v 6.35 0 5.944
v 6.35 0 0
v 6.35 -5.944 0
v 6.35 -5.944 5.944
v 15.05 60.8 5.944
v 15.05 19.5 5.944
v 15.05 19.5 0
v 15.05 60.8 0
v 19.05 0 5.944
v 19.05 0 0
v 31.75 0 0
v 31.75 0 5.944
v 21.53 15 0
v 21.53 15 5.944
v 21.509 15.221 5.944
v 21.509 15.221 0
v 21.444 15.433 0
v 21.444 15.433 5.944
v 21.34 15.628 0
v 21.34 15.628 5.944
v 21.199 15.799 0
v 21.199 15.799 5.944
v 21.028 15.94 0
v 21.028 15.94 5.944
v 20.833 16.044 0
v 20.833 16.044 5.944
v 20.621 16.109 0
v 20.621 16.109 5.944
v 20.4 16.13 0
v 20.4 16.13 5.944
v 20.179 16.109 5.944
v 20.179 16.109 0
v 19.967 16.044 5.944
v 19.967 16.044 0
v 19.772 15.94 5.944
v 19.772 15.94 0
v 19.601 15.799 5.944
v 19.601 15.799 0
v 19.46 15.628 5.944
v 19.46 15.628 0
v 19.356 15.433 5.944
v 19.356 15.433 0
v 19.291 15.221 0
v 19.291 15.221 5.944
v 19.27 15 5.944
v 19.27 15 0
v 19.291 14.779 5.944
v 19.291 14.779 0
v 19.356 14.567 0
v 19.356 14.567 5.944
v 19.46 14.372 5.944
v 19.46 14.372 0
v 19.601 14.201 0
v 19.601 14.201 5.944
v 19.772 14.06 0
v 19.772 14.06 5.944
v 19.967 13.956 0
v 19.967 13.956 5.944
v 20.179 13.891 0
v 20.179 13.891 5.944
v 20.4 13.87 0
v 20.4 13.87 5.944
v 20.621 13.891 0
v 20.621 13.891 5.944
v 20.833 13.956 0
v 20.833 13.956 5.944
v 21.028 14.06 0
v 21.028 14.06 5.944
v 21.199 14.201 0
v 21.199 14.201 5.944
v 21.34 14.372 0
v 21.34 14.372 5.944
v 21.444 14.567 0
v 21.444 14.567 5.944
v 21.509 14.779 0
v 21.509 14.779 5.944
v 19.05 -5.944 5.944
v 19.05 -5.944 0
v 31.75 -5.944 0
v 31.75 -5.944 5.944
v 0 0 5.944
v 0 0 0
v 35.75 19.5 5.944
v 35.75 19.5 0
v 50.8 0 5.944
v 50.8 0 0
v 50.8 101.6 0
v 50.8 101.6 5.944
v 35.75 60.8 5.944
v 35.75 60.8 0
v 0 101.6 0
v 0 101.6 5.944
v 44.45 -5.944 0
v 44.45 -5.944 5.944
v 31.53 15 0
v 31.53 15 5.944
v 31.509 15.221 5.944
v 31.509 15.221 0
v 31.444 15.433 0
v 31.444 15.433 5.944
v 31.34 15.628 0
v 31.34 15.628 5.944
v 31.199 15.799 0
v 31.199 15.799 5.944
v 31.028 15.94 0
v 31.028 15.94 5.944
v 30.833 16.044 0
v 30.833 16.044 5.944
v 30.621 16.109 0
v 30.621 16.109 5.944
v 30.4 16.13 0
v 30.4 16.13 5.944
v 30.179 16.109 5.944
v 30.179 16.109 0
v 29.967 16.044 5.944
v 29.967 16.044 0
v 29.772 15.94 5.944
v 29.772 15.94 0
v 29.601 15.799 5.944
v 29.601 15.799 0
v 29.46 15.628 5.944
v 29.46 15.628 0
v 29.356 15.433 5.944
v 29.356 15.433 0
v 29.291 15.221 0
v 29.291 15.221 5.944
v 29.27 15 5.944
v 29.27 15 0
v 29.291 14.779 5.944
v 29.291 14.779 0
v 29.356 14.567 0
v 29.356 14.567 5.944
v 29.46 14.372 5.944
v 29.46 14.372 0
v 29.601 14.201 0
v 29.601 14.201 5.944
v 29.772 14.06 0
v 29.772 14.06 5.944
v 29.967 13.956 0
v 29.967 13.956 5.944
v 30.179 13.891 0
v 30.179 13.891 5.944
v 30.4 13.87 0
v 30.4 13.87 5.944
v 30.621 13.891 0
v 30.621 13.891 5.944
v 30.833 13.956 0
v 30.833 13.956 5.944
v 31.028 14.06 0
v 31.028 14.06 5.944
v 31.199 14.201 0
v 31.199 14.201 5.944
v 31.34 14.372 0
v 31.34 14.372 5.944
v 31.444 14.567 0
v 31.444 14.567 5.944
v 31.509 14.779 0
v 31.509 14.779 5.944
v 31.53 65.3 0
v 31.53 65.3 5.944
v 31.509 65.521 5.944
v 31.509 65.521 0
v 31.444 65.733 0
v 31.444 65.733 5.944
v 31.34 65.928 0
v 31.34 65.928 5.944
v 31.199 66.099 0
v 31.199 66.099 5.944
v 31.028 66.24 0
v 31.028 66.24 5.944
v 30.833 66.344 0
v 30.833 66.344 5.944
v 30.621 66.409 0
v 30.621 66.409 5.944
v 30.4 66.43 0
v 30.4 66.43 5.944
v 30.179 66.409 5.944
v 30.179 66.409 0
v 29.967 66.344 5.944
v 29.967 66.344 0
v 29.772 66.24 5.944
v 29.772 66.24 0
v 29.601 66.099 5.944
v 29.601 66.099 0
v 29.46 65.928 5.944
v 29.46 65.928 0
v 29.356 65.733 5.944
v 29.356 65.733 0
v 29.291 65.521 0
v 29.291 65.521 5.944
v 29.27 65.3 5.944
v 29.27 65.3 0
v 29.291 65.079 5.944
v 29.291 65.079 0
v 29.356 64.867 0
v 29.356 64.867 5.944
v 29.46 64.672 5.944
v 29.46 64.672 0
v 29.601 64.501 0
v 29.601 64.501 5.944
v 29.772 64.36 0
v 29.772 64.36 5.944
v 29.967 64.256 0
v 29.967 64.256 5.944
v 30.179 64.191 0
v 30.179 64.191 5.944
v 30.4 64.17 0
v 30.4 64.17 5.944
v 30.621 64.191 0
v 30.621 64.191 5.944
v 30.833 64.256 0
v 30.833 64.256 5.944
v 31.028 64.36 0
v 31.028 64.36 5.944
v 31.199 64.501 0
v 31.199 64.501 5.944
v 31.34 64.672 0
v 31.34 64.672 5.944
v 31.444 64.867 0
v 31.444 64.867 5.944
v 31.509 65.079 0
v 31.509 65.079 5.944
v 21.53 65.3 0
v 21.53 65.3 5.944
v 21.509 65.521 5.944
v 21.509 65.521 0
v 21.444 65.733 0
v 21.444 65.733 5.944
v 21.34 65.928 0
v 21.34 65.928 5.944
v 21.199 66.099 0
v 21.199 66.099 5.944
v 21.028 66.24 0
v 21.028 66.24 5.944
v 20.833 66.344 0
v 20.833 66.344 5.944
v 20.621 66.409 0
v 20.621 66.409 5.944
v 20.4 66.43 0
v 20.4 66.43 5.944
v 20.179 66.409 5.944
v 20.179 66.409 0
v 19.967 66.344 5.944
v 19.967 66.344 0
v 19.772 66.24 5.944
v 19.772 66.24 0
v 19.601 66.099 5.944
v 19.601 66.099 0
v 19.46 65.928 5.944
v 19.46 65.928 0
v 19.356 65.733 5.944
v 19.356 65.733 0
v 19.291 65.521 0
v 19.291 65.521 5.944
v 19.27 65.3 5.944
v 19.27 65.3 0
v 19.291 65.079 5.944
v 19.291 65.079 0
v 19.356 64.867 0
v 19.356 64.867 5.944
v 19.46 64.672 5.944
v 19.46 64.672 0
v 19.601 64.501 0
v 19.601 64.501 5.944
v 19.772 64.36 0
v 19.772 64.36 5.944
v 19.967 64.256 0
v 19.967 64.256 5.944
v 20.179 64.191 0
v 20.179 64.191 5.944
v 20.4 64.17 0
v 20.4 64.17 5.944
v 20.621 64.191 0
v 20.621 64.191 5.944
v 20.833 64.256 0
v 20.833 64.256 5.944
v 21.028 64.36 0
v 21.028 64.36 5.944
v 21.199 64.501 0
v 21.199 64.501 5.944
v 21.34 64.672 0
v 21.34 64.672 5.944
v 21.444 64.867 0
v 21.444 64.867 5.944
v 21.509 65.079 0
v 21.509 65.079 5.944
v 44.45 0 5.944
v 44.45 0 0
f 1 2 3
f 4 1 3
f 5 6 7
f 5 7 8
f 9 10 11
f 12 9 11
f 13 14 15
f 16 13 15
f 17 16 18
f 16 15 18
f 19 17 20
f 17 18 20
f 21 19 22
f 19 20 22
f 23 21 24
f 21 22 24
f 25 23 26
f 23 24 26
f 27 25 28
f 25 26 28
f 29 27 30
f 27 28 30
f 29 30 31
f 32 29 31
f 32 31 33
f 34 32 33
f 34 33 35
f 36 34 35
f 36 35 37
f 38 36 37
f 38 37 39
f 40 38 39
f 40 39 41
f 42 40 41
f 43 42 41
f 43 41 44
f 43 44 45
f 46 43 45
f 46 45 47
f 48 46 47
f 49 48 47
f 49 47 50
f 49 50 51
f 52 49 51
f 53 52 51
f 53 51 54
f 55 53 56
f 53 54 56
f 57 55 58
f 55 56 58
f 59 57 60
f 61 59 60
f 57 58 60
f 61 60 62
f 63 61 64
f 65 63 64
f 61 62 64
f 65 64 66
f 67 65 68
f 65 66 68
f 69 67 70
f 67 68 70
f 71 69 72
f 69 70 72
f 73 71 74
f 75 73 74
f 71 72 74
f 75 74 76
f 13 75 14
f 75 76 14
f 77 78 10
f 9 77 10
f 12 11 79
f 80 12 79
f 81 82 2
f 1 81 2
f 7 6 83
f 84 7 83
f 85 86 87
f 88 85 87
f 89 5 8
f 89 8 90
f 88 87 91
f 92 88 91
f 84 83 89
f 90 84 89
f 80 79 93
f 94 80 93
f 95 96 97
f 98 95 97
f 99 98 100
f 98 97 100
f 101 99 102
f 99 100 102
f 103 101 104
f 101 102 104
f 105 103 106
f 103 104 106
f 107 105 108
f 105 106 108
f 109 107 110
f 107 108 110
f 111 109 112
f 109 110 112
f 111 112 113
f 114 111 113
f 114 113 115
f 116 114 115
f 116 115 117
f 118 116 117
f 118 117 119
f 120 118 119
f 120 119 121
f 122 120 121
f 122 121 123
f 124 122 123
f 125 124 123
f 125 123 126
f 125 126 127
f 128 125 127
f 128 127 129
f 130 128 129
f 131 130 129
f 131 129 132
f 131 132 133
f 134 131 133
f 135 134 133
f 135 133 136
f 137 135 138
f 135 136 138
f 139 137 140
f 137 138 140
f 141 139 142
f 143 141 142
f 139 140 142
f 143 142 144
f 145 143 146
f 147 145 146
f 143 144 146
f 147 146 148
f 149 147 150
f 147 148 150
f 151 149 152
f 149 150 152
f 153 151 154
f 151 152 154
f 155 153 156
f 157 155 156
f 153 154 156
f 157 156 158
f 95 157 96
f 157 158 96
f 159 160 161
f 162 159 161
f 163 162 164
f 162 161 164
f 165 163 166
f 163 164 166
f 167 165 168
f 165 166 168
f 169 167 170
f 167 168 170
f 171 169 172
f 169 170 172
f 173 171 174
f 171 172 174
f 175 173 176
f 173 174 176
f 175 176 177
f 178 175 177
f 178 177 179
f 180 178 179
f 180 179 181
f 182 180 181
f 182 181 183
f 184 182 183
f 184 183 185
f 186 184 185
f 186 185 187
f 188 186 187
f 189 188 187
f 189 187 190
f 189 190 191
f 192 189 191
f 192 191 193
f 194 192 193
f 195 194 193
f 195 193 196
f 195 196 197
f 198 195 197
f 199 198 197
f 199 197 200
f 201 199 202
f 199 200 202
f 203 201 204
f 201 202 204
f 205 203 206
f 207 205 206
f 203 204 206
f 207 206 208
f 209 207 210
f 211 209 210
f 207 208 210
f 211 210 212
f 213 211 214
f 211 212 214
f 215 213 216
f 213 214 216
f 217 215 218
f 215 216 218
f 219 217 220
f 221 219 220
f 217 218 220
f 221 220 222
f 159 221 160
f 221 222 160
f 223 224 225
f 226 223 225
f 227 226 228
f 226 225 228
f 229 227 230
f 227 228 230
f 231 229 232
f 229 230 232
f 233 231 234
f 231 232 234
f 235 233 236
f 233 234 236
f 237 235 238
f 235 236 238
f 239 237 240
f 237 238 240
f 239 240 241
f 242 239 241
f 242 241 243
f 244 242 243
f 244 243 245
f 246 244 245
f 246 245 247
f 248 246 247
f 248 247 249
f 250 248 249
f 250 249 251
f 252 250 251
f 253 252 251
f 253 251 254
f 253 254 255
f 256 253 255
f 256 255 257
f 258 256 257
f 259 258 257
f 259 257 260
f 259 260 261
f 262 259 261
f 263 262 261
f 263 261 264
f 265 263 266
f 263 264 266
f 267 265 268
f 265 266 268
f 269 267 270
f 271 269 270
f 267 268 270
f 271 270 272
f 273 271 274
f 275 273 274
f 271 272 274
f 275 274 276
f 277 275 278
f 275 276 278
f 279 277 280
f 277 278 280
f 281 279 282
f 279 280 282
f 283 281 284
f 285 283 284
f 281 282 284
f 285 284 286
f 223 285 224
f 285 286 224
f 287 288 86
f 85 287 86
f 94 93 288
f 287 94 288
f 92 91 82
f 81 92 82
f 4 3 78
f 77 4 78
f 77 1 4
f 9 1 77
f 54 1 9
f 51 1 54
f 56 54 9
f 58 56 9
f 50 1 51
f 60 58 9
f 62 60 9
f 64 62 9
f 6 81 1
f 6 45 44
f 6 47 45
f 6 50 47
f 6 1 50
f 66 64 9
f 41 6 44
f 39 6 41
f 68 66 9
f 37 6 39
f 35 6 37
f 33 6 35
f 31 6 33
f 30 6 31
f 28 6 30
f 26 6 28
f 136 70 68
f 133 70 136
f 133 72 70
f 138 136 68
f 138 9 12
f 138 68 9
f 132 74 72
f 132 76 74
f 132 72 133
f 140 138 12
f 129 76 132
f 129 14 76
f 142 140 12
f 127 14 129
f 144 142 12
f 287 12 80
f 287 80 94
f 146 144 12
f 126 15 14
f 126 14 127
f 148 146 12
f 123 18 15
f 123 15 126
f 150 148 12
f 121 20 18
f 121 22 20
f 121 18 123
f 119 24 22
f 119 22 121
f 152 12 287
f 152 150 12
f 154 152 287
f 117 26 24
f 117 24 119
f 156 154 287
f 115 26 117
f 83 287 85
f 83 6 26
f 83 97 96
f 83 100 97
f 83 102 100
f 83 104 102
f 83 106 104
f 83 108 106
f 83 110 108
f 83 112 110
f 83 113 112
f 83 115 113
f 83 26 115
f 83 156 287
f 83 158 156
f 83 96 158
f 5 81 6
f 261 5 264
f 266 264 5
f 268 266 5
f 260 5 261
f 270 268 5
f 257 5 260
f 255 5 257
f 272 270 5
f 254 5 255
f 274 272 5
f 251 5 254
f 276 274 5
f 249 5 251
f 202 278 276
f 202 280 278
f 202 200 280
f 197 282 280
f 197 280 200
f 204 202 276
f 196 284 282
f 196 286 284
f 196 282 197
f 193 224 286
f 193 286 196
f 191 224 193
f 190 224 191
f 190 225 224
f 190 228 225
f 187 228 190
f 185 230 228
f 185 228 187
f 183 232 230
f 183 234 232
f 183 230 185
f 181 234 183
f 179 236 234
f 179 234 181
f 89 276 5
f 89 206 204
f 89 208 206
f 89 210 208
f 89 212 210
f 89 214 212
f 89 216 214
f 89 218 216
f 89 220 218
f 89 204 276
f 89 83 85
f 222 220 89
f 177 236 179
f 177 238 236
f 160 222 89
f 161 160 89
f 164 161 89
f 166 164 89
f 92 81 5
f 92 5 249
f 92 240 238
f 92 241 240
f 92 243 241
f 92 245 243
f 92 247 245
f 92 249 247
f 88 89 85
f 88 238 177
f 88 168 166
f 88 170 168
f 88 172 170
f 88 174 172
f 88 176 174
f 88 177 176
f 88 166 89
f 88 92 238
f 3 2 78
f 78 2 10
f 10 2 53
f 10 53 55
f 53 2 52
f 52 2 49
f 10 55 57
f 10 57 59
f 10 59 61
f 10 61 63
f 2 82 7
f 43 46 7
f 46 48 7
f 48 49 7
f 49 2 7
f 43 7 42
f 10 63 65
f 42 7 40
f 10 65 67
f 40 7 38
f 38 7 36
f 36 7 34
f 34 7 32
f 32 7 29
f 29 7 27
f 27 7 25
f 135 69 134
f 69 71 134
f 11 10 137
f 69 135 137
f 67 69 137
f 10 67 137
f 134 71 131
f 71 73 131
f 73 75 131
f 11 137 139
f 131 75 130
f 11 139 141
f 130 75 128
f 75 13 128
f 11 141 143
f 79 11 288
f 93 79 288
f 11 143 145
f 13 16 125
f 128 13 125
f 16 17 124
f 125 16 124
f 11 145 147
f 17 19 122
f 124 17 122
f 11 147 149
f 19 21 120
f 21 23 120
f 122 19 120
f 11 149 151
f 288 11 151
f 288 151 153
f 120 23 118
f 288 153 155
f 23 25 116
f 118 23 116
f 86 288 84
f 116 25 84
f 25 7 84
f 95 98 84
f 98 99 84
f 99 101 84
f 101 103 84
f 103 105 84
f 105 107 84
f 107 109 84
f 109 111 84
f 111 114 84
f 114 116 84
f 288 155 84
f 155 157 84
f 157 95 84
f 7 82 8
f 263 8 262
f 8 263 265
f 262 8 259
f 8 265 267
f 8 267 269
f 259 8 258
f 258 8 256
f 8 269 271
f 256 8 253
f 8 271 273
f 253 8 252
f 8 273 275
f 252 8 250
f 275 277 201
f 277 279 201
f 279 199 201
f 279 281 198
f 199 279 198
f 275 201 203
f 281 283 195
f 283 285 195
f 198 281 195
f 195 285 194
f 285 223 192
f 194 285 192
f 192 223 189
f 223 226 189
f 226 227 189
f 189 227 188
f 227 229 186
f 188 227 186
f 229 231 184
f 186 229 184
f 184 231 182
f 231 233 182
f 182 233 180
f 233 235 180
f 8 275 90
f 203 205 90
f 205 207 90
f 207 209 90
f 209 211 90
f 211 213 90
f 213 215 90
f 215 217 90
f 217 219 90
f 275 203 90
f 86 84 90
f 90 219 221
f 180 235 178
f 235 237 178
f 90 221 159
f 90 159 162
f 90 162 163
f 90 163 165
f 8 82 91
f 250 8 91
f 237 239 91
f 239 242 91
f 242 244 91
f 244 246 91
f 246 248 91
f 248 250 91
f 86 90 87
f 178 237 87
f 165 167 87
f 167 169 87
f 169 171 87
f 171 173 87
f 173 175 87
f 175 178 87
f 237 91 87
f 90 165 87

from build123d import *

# Parameters (mm, degrees)
BOSS_EXTRUDE1_DEPTH = 5.9436
SKETCH2_R           = 1.1303
SKETCH2_W           = 20.7
SKETCH2_H           = 41.3
CUT_EXTRUDE1_DEPTH  = 6.9436


with BuildPart() as part:
    # Sketch1 → Boss-Extrude1 (new body)
    with BuildSketch(Plane.XY):
        Polygon((6.35, 0), (6.35, -5.9436), (19.05, -5.9436), (19.05, 0), (31.75, 0), (31.75, -5.9436), (44.45, -5.9436), (44.45, 0), (50.8, 0), (50.8, 101.6), (0, 101.6), (0, 0), align=None)
    extrude(amount=BOSS_EXTRUDE1_DEPTH)

    # Sketch2 → Cut-Extrude1 (cut, through all)
    with BuildSketch(Plane.XY.offset(5.9436)):
        with Locations((20.4, 65.3)):
            Circle(SKETCH2_R)
        with Locations((30.4, 65.3)):
            Circle(SKETCH2_R)
        with Locations((20.4, 15)):
            Circle(SKETCH2_R)
        with Locations((30.4, 15)):
            Circle(SKETCH2_R)
        with Locations((25.4, 40.15)):
            Rectangle(SKETCH2_W, SKETCH2_H)
    extrude(amount=-CUT_EXTRUDE1_DEPTH, mode=Mode.SUBTRACT)


solid = part.part
